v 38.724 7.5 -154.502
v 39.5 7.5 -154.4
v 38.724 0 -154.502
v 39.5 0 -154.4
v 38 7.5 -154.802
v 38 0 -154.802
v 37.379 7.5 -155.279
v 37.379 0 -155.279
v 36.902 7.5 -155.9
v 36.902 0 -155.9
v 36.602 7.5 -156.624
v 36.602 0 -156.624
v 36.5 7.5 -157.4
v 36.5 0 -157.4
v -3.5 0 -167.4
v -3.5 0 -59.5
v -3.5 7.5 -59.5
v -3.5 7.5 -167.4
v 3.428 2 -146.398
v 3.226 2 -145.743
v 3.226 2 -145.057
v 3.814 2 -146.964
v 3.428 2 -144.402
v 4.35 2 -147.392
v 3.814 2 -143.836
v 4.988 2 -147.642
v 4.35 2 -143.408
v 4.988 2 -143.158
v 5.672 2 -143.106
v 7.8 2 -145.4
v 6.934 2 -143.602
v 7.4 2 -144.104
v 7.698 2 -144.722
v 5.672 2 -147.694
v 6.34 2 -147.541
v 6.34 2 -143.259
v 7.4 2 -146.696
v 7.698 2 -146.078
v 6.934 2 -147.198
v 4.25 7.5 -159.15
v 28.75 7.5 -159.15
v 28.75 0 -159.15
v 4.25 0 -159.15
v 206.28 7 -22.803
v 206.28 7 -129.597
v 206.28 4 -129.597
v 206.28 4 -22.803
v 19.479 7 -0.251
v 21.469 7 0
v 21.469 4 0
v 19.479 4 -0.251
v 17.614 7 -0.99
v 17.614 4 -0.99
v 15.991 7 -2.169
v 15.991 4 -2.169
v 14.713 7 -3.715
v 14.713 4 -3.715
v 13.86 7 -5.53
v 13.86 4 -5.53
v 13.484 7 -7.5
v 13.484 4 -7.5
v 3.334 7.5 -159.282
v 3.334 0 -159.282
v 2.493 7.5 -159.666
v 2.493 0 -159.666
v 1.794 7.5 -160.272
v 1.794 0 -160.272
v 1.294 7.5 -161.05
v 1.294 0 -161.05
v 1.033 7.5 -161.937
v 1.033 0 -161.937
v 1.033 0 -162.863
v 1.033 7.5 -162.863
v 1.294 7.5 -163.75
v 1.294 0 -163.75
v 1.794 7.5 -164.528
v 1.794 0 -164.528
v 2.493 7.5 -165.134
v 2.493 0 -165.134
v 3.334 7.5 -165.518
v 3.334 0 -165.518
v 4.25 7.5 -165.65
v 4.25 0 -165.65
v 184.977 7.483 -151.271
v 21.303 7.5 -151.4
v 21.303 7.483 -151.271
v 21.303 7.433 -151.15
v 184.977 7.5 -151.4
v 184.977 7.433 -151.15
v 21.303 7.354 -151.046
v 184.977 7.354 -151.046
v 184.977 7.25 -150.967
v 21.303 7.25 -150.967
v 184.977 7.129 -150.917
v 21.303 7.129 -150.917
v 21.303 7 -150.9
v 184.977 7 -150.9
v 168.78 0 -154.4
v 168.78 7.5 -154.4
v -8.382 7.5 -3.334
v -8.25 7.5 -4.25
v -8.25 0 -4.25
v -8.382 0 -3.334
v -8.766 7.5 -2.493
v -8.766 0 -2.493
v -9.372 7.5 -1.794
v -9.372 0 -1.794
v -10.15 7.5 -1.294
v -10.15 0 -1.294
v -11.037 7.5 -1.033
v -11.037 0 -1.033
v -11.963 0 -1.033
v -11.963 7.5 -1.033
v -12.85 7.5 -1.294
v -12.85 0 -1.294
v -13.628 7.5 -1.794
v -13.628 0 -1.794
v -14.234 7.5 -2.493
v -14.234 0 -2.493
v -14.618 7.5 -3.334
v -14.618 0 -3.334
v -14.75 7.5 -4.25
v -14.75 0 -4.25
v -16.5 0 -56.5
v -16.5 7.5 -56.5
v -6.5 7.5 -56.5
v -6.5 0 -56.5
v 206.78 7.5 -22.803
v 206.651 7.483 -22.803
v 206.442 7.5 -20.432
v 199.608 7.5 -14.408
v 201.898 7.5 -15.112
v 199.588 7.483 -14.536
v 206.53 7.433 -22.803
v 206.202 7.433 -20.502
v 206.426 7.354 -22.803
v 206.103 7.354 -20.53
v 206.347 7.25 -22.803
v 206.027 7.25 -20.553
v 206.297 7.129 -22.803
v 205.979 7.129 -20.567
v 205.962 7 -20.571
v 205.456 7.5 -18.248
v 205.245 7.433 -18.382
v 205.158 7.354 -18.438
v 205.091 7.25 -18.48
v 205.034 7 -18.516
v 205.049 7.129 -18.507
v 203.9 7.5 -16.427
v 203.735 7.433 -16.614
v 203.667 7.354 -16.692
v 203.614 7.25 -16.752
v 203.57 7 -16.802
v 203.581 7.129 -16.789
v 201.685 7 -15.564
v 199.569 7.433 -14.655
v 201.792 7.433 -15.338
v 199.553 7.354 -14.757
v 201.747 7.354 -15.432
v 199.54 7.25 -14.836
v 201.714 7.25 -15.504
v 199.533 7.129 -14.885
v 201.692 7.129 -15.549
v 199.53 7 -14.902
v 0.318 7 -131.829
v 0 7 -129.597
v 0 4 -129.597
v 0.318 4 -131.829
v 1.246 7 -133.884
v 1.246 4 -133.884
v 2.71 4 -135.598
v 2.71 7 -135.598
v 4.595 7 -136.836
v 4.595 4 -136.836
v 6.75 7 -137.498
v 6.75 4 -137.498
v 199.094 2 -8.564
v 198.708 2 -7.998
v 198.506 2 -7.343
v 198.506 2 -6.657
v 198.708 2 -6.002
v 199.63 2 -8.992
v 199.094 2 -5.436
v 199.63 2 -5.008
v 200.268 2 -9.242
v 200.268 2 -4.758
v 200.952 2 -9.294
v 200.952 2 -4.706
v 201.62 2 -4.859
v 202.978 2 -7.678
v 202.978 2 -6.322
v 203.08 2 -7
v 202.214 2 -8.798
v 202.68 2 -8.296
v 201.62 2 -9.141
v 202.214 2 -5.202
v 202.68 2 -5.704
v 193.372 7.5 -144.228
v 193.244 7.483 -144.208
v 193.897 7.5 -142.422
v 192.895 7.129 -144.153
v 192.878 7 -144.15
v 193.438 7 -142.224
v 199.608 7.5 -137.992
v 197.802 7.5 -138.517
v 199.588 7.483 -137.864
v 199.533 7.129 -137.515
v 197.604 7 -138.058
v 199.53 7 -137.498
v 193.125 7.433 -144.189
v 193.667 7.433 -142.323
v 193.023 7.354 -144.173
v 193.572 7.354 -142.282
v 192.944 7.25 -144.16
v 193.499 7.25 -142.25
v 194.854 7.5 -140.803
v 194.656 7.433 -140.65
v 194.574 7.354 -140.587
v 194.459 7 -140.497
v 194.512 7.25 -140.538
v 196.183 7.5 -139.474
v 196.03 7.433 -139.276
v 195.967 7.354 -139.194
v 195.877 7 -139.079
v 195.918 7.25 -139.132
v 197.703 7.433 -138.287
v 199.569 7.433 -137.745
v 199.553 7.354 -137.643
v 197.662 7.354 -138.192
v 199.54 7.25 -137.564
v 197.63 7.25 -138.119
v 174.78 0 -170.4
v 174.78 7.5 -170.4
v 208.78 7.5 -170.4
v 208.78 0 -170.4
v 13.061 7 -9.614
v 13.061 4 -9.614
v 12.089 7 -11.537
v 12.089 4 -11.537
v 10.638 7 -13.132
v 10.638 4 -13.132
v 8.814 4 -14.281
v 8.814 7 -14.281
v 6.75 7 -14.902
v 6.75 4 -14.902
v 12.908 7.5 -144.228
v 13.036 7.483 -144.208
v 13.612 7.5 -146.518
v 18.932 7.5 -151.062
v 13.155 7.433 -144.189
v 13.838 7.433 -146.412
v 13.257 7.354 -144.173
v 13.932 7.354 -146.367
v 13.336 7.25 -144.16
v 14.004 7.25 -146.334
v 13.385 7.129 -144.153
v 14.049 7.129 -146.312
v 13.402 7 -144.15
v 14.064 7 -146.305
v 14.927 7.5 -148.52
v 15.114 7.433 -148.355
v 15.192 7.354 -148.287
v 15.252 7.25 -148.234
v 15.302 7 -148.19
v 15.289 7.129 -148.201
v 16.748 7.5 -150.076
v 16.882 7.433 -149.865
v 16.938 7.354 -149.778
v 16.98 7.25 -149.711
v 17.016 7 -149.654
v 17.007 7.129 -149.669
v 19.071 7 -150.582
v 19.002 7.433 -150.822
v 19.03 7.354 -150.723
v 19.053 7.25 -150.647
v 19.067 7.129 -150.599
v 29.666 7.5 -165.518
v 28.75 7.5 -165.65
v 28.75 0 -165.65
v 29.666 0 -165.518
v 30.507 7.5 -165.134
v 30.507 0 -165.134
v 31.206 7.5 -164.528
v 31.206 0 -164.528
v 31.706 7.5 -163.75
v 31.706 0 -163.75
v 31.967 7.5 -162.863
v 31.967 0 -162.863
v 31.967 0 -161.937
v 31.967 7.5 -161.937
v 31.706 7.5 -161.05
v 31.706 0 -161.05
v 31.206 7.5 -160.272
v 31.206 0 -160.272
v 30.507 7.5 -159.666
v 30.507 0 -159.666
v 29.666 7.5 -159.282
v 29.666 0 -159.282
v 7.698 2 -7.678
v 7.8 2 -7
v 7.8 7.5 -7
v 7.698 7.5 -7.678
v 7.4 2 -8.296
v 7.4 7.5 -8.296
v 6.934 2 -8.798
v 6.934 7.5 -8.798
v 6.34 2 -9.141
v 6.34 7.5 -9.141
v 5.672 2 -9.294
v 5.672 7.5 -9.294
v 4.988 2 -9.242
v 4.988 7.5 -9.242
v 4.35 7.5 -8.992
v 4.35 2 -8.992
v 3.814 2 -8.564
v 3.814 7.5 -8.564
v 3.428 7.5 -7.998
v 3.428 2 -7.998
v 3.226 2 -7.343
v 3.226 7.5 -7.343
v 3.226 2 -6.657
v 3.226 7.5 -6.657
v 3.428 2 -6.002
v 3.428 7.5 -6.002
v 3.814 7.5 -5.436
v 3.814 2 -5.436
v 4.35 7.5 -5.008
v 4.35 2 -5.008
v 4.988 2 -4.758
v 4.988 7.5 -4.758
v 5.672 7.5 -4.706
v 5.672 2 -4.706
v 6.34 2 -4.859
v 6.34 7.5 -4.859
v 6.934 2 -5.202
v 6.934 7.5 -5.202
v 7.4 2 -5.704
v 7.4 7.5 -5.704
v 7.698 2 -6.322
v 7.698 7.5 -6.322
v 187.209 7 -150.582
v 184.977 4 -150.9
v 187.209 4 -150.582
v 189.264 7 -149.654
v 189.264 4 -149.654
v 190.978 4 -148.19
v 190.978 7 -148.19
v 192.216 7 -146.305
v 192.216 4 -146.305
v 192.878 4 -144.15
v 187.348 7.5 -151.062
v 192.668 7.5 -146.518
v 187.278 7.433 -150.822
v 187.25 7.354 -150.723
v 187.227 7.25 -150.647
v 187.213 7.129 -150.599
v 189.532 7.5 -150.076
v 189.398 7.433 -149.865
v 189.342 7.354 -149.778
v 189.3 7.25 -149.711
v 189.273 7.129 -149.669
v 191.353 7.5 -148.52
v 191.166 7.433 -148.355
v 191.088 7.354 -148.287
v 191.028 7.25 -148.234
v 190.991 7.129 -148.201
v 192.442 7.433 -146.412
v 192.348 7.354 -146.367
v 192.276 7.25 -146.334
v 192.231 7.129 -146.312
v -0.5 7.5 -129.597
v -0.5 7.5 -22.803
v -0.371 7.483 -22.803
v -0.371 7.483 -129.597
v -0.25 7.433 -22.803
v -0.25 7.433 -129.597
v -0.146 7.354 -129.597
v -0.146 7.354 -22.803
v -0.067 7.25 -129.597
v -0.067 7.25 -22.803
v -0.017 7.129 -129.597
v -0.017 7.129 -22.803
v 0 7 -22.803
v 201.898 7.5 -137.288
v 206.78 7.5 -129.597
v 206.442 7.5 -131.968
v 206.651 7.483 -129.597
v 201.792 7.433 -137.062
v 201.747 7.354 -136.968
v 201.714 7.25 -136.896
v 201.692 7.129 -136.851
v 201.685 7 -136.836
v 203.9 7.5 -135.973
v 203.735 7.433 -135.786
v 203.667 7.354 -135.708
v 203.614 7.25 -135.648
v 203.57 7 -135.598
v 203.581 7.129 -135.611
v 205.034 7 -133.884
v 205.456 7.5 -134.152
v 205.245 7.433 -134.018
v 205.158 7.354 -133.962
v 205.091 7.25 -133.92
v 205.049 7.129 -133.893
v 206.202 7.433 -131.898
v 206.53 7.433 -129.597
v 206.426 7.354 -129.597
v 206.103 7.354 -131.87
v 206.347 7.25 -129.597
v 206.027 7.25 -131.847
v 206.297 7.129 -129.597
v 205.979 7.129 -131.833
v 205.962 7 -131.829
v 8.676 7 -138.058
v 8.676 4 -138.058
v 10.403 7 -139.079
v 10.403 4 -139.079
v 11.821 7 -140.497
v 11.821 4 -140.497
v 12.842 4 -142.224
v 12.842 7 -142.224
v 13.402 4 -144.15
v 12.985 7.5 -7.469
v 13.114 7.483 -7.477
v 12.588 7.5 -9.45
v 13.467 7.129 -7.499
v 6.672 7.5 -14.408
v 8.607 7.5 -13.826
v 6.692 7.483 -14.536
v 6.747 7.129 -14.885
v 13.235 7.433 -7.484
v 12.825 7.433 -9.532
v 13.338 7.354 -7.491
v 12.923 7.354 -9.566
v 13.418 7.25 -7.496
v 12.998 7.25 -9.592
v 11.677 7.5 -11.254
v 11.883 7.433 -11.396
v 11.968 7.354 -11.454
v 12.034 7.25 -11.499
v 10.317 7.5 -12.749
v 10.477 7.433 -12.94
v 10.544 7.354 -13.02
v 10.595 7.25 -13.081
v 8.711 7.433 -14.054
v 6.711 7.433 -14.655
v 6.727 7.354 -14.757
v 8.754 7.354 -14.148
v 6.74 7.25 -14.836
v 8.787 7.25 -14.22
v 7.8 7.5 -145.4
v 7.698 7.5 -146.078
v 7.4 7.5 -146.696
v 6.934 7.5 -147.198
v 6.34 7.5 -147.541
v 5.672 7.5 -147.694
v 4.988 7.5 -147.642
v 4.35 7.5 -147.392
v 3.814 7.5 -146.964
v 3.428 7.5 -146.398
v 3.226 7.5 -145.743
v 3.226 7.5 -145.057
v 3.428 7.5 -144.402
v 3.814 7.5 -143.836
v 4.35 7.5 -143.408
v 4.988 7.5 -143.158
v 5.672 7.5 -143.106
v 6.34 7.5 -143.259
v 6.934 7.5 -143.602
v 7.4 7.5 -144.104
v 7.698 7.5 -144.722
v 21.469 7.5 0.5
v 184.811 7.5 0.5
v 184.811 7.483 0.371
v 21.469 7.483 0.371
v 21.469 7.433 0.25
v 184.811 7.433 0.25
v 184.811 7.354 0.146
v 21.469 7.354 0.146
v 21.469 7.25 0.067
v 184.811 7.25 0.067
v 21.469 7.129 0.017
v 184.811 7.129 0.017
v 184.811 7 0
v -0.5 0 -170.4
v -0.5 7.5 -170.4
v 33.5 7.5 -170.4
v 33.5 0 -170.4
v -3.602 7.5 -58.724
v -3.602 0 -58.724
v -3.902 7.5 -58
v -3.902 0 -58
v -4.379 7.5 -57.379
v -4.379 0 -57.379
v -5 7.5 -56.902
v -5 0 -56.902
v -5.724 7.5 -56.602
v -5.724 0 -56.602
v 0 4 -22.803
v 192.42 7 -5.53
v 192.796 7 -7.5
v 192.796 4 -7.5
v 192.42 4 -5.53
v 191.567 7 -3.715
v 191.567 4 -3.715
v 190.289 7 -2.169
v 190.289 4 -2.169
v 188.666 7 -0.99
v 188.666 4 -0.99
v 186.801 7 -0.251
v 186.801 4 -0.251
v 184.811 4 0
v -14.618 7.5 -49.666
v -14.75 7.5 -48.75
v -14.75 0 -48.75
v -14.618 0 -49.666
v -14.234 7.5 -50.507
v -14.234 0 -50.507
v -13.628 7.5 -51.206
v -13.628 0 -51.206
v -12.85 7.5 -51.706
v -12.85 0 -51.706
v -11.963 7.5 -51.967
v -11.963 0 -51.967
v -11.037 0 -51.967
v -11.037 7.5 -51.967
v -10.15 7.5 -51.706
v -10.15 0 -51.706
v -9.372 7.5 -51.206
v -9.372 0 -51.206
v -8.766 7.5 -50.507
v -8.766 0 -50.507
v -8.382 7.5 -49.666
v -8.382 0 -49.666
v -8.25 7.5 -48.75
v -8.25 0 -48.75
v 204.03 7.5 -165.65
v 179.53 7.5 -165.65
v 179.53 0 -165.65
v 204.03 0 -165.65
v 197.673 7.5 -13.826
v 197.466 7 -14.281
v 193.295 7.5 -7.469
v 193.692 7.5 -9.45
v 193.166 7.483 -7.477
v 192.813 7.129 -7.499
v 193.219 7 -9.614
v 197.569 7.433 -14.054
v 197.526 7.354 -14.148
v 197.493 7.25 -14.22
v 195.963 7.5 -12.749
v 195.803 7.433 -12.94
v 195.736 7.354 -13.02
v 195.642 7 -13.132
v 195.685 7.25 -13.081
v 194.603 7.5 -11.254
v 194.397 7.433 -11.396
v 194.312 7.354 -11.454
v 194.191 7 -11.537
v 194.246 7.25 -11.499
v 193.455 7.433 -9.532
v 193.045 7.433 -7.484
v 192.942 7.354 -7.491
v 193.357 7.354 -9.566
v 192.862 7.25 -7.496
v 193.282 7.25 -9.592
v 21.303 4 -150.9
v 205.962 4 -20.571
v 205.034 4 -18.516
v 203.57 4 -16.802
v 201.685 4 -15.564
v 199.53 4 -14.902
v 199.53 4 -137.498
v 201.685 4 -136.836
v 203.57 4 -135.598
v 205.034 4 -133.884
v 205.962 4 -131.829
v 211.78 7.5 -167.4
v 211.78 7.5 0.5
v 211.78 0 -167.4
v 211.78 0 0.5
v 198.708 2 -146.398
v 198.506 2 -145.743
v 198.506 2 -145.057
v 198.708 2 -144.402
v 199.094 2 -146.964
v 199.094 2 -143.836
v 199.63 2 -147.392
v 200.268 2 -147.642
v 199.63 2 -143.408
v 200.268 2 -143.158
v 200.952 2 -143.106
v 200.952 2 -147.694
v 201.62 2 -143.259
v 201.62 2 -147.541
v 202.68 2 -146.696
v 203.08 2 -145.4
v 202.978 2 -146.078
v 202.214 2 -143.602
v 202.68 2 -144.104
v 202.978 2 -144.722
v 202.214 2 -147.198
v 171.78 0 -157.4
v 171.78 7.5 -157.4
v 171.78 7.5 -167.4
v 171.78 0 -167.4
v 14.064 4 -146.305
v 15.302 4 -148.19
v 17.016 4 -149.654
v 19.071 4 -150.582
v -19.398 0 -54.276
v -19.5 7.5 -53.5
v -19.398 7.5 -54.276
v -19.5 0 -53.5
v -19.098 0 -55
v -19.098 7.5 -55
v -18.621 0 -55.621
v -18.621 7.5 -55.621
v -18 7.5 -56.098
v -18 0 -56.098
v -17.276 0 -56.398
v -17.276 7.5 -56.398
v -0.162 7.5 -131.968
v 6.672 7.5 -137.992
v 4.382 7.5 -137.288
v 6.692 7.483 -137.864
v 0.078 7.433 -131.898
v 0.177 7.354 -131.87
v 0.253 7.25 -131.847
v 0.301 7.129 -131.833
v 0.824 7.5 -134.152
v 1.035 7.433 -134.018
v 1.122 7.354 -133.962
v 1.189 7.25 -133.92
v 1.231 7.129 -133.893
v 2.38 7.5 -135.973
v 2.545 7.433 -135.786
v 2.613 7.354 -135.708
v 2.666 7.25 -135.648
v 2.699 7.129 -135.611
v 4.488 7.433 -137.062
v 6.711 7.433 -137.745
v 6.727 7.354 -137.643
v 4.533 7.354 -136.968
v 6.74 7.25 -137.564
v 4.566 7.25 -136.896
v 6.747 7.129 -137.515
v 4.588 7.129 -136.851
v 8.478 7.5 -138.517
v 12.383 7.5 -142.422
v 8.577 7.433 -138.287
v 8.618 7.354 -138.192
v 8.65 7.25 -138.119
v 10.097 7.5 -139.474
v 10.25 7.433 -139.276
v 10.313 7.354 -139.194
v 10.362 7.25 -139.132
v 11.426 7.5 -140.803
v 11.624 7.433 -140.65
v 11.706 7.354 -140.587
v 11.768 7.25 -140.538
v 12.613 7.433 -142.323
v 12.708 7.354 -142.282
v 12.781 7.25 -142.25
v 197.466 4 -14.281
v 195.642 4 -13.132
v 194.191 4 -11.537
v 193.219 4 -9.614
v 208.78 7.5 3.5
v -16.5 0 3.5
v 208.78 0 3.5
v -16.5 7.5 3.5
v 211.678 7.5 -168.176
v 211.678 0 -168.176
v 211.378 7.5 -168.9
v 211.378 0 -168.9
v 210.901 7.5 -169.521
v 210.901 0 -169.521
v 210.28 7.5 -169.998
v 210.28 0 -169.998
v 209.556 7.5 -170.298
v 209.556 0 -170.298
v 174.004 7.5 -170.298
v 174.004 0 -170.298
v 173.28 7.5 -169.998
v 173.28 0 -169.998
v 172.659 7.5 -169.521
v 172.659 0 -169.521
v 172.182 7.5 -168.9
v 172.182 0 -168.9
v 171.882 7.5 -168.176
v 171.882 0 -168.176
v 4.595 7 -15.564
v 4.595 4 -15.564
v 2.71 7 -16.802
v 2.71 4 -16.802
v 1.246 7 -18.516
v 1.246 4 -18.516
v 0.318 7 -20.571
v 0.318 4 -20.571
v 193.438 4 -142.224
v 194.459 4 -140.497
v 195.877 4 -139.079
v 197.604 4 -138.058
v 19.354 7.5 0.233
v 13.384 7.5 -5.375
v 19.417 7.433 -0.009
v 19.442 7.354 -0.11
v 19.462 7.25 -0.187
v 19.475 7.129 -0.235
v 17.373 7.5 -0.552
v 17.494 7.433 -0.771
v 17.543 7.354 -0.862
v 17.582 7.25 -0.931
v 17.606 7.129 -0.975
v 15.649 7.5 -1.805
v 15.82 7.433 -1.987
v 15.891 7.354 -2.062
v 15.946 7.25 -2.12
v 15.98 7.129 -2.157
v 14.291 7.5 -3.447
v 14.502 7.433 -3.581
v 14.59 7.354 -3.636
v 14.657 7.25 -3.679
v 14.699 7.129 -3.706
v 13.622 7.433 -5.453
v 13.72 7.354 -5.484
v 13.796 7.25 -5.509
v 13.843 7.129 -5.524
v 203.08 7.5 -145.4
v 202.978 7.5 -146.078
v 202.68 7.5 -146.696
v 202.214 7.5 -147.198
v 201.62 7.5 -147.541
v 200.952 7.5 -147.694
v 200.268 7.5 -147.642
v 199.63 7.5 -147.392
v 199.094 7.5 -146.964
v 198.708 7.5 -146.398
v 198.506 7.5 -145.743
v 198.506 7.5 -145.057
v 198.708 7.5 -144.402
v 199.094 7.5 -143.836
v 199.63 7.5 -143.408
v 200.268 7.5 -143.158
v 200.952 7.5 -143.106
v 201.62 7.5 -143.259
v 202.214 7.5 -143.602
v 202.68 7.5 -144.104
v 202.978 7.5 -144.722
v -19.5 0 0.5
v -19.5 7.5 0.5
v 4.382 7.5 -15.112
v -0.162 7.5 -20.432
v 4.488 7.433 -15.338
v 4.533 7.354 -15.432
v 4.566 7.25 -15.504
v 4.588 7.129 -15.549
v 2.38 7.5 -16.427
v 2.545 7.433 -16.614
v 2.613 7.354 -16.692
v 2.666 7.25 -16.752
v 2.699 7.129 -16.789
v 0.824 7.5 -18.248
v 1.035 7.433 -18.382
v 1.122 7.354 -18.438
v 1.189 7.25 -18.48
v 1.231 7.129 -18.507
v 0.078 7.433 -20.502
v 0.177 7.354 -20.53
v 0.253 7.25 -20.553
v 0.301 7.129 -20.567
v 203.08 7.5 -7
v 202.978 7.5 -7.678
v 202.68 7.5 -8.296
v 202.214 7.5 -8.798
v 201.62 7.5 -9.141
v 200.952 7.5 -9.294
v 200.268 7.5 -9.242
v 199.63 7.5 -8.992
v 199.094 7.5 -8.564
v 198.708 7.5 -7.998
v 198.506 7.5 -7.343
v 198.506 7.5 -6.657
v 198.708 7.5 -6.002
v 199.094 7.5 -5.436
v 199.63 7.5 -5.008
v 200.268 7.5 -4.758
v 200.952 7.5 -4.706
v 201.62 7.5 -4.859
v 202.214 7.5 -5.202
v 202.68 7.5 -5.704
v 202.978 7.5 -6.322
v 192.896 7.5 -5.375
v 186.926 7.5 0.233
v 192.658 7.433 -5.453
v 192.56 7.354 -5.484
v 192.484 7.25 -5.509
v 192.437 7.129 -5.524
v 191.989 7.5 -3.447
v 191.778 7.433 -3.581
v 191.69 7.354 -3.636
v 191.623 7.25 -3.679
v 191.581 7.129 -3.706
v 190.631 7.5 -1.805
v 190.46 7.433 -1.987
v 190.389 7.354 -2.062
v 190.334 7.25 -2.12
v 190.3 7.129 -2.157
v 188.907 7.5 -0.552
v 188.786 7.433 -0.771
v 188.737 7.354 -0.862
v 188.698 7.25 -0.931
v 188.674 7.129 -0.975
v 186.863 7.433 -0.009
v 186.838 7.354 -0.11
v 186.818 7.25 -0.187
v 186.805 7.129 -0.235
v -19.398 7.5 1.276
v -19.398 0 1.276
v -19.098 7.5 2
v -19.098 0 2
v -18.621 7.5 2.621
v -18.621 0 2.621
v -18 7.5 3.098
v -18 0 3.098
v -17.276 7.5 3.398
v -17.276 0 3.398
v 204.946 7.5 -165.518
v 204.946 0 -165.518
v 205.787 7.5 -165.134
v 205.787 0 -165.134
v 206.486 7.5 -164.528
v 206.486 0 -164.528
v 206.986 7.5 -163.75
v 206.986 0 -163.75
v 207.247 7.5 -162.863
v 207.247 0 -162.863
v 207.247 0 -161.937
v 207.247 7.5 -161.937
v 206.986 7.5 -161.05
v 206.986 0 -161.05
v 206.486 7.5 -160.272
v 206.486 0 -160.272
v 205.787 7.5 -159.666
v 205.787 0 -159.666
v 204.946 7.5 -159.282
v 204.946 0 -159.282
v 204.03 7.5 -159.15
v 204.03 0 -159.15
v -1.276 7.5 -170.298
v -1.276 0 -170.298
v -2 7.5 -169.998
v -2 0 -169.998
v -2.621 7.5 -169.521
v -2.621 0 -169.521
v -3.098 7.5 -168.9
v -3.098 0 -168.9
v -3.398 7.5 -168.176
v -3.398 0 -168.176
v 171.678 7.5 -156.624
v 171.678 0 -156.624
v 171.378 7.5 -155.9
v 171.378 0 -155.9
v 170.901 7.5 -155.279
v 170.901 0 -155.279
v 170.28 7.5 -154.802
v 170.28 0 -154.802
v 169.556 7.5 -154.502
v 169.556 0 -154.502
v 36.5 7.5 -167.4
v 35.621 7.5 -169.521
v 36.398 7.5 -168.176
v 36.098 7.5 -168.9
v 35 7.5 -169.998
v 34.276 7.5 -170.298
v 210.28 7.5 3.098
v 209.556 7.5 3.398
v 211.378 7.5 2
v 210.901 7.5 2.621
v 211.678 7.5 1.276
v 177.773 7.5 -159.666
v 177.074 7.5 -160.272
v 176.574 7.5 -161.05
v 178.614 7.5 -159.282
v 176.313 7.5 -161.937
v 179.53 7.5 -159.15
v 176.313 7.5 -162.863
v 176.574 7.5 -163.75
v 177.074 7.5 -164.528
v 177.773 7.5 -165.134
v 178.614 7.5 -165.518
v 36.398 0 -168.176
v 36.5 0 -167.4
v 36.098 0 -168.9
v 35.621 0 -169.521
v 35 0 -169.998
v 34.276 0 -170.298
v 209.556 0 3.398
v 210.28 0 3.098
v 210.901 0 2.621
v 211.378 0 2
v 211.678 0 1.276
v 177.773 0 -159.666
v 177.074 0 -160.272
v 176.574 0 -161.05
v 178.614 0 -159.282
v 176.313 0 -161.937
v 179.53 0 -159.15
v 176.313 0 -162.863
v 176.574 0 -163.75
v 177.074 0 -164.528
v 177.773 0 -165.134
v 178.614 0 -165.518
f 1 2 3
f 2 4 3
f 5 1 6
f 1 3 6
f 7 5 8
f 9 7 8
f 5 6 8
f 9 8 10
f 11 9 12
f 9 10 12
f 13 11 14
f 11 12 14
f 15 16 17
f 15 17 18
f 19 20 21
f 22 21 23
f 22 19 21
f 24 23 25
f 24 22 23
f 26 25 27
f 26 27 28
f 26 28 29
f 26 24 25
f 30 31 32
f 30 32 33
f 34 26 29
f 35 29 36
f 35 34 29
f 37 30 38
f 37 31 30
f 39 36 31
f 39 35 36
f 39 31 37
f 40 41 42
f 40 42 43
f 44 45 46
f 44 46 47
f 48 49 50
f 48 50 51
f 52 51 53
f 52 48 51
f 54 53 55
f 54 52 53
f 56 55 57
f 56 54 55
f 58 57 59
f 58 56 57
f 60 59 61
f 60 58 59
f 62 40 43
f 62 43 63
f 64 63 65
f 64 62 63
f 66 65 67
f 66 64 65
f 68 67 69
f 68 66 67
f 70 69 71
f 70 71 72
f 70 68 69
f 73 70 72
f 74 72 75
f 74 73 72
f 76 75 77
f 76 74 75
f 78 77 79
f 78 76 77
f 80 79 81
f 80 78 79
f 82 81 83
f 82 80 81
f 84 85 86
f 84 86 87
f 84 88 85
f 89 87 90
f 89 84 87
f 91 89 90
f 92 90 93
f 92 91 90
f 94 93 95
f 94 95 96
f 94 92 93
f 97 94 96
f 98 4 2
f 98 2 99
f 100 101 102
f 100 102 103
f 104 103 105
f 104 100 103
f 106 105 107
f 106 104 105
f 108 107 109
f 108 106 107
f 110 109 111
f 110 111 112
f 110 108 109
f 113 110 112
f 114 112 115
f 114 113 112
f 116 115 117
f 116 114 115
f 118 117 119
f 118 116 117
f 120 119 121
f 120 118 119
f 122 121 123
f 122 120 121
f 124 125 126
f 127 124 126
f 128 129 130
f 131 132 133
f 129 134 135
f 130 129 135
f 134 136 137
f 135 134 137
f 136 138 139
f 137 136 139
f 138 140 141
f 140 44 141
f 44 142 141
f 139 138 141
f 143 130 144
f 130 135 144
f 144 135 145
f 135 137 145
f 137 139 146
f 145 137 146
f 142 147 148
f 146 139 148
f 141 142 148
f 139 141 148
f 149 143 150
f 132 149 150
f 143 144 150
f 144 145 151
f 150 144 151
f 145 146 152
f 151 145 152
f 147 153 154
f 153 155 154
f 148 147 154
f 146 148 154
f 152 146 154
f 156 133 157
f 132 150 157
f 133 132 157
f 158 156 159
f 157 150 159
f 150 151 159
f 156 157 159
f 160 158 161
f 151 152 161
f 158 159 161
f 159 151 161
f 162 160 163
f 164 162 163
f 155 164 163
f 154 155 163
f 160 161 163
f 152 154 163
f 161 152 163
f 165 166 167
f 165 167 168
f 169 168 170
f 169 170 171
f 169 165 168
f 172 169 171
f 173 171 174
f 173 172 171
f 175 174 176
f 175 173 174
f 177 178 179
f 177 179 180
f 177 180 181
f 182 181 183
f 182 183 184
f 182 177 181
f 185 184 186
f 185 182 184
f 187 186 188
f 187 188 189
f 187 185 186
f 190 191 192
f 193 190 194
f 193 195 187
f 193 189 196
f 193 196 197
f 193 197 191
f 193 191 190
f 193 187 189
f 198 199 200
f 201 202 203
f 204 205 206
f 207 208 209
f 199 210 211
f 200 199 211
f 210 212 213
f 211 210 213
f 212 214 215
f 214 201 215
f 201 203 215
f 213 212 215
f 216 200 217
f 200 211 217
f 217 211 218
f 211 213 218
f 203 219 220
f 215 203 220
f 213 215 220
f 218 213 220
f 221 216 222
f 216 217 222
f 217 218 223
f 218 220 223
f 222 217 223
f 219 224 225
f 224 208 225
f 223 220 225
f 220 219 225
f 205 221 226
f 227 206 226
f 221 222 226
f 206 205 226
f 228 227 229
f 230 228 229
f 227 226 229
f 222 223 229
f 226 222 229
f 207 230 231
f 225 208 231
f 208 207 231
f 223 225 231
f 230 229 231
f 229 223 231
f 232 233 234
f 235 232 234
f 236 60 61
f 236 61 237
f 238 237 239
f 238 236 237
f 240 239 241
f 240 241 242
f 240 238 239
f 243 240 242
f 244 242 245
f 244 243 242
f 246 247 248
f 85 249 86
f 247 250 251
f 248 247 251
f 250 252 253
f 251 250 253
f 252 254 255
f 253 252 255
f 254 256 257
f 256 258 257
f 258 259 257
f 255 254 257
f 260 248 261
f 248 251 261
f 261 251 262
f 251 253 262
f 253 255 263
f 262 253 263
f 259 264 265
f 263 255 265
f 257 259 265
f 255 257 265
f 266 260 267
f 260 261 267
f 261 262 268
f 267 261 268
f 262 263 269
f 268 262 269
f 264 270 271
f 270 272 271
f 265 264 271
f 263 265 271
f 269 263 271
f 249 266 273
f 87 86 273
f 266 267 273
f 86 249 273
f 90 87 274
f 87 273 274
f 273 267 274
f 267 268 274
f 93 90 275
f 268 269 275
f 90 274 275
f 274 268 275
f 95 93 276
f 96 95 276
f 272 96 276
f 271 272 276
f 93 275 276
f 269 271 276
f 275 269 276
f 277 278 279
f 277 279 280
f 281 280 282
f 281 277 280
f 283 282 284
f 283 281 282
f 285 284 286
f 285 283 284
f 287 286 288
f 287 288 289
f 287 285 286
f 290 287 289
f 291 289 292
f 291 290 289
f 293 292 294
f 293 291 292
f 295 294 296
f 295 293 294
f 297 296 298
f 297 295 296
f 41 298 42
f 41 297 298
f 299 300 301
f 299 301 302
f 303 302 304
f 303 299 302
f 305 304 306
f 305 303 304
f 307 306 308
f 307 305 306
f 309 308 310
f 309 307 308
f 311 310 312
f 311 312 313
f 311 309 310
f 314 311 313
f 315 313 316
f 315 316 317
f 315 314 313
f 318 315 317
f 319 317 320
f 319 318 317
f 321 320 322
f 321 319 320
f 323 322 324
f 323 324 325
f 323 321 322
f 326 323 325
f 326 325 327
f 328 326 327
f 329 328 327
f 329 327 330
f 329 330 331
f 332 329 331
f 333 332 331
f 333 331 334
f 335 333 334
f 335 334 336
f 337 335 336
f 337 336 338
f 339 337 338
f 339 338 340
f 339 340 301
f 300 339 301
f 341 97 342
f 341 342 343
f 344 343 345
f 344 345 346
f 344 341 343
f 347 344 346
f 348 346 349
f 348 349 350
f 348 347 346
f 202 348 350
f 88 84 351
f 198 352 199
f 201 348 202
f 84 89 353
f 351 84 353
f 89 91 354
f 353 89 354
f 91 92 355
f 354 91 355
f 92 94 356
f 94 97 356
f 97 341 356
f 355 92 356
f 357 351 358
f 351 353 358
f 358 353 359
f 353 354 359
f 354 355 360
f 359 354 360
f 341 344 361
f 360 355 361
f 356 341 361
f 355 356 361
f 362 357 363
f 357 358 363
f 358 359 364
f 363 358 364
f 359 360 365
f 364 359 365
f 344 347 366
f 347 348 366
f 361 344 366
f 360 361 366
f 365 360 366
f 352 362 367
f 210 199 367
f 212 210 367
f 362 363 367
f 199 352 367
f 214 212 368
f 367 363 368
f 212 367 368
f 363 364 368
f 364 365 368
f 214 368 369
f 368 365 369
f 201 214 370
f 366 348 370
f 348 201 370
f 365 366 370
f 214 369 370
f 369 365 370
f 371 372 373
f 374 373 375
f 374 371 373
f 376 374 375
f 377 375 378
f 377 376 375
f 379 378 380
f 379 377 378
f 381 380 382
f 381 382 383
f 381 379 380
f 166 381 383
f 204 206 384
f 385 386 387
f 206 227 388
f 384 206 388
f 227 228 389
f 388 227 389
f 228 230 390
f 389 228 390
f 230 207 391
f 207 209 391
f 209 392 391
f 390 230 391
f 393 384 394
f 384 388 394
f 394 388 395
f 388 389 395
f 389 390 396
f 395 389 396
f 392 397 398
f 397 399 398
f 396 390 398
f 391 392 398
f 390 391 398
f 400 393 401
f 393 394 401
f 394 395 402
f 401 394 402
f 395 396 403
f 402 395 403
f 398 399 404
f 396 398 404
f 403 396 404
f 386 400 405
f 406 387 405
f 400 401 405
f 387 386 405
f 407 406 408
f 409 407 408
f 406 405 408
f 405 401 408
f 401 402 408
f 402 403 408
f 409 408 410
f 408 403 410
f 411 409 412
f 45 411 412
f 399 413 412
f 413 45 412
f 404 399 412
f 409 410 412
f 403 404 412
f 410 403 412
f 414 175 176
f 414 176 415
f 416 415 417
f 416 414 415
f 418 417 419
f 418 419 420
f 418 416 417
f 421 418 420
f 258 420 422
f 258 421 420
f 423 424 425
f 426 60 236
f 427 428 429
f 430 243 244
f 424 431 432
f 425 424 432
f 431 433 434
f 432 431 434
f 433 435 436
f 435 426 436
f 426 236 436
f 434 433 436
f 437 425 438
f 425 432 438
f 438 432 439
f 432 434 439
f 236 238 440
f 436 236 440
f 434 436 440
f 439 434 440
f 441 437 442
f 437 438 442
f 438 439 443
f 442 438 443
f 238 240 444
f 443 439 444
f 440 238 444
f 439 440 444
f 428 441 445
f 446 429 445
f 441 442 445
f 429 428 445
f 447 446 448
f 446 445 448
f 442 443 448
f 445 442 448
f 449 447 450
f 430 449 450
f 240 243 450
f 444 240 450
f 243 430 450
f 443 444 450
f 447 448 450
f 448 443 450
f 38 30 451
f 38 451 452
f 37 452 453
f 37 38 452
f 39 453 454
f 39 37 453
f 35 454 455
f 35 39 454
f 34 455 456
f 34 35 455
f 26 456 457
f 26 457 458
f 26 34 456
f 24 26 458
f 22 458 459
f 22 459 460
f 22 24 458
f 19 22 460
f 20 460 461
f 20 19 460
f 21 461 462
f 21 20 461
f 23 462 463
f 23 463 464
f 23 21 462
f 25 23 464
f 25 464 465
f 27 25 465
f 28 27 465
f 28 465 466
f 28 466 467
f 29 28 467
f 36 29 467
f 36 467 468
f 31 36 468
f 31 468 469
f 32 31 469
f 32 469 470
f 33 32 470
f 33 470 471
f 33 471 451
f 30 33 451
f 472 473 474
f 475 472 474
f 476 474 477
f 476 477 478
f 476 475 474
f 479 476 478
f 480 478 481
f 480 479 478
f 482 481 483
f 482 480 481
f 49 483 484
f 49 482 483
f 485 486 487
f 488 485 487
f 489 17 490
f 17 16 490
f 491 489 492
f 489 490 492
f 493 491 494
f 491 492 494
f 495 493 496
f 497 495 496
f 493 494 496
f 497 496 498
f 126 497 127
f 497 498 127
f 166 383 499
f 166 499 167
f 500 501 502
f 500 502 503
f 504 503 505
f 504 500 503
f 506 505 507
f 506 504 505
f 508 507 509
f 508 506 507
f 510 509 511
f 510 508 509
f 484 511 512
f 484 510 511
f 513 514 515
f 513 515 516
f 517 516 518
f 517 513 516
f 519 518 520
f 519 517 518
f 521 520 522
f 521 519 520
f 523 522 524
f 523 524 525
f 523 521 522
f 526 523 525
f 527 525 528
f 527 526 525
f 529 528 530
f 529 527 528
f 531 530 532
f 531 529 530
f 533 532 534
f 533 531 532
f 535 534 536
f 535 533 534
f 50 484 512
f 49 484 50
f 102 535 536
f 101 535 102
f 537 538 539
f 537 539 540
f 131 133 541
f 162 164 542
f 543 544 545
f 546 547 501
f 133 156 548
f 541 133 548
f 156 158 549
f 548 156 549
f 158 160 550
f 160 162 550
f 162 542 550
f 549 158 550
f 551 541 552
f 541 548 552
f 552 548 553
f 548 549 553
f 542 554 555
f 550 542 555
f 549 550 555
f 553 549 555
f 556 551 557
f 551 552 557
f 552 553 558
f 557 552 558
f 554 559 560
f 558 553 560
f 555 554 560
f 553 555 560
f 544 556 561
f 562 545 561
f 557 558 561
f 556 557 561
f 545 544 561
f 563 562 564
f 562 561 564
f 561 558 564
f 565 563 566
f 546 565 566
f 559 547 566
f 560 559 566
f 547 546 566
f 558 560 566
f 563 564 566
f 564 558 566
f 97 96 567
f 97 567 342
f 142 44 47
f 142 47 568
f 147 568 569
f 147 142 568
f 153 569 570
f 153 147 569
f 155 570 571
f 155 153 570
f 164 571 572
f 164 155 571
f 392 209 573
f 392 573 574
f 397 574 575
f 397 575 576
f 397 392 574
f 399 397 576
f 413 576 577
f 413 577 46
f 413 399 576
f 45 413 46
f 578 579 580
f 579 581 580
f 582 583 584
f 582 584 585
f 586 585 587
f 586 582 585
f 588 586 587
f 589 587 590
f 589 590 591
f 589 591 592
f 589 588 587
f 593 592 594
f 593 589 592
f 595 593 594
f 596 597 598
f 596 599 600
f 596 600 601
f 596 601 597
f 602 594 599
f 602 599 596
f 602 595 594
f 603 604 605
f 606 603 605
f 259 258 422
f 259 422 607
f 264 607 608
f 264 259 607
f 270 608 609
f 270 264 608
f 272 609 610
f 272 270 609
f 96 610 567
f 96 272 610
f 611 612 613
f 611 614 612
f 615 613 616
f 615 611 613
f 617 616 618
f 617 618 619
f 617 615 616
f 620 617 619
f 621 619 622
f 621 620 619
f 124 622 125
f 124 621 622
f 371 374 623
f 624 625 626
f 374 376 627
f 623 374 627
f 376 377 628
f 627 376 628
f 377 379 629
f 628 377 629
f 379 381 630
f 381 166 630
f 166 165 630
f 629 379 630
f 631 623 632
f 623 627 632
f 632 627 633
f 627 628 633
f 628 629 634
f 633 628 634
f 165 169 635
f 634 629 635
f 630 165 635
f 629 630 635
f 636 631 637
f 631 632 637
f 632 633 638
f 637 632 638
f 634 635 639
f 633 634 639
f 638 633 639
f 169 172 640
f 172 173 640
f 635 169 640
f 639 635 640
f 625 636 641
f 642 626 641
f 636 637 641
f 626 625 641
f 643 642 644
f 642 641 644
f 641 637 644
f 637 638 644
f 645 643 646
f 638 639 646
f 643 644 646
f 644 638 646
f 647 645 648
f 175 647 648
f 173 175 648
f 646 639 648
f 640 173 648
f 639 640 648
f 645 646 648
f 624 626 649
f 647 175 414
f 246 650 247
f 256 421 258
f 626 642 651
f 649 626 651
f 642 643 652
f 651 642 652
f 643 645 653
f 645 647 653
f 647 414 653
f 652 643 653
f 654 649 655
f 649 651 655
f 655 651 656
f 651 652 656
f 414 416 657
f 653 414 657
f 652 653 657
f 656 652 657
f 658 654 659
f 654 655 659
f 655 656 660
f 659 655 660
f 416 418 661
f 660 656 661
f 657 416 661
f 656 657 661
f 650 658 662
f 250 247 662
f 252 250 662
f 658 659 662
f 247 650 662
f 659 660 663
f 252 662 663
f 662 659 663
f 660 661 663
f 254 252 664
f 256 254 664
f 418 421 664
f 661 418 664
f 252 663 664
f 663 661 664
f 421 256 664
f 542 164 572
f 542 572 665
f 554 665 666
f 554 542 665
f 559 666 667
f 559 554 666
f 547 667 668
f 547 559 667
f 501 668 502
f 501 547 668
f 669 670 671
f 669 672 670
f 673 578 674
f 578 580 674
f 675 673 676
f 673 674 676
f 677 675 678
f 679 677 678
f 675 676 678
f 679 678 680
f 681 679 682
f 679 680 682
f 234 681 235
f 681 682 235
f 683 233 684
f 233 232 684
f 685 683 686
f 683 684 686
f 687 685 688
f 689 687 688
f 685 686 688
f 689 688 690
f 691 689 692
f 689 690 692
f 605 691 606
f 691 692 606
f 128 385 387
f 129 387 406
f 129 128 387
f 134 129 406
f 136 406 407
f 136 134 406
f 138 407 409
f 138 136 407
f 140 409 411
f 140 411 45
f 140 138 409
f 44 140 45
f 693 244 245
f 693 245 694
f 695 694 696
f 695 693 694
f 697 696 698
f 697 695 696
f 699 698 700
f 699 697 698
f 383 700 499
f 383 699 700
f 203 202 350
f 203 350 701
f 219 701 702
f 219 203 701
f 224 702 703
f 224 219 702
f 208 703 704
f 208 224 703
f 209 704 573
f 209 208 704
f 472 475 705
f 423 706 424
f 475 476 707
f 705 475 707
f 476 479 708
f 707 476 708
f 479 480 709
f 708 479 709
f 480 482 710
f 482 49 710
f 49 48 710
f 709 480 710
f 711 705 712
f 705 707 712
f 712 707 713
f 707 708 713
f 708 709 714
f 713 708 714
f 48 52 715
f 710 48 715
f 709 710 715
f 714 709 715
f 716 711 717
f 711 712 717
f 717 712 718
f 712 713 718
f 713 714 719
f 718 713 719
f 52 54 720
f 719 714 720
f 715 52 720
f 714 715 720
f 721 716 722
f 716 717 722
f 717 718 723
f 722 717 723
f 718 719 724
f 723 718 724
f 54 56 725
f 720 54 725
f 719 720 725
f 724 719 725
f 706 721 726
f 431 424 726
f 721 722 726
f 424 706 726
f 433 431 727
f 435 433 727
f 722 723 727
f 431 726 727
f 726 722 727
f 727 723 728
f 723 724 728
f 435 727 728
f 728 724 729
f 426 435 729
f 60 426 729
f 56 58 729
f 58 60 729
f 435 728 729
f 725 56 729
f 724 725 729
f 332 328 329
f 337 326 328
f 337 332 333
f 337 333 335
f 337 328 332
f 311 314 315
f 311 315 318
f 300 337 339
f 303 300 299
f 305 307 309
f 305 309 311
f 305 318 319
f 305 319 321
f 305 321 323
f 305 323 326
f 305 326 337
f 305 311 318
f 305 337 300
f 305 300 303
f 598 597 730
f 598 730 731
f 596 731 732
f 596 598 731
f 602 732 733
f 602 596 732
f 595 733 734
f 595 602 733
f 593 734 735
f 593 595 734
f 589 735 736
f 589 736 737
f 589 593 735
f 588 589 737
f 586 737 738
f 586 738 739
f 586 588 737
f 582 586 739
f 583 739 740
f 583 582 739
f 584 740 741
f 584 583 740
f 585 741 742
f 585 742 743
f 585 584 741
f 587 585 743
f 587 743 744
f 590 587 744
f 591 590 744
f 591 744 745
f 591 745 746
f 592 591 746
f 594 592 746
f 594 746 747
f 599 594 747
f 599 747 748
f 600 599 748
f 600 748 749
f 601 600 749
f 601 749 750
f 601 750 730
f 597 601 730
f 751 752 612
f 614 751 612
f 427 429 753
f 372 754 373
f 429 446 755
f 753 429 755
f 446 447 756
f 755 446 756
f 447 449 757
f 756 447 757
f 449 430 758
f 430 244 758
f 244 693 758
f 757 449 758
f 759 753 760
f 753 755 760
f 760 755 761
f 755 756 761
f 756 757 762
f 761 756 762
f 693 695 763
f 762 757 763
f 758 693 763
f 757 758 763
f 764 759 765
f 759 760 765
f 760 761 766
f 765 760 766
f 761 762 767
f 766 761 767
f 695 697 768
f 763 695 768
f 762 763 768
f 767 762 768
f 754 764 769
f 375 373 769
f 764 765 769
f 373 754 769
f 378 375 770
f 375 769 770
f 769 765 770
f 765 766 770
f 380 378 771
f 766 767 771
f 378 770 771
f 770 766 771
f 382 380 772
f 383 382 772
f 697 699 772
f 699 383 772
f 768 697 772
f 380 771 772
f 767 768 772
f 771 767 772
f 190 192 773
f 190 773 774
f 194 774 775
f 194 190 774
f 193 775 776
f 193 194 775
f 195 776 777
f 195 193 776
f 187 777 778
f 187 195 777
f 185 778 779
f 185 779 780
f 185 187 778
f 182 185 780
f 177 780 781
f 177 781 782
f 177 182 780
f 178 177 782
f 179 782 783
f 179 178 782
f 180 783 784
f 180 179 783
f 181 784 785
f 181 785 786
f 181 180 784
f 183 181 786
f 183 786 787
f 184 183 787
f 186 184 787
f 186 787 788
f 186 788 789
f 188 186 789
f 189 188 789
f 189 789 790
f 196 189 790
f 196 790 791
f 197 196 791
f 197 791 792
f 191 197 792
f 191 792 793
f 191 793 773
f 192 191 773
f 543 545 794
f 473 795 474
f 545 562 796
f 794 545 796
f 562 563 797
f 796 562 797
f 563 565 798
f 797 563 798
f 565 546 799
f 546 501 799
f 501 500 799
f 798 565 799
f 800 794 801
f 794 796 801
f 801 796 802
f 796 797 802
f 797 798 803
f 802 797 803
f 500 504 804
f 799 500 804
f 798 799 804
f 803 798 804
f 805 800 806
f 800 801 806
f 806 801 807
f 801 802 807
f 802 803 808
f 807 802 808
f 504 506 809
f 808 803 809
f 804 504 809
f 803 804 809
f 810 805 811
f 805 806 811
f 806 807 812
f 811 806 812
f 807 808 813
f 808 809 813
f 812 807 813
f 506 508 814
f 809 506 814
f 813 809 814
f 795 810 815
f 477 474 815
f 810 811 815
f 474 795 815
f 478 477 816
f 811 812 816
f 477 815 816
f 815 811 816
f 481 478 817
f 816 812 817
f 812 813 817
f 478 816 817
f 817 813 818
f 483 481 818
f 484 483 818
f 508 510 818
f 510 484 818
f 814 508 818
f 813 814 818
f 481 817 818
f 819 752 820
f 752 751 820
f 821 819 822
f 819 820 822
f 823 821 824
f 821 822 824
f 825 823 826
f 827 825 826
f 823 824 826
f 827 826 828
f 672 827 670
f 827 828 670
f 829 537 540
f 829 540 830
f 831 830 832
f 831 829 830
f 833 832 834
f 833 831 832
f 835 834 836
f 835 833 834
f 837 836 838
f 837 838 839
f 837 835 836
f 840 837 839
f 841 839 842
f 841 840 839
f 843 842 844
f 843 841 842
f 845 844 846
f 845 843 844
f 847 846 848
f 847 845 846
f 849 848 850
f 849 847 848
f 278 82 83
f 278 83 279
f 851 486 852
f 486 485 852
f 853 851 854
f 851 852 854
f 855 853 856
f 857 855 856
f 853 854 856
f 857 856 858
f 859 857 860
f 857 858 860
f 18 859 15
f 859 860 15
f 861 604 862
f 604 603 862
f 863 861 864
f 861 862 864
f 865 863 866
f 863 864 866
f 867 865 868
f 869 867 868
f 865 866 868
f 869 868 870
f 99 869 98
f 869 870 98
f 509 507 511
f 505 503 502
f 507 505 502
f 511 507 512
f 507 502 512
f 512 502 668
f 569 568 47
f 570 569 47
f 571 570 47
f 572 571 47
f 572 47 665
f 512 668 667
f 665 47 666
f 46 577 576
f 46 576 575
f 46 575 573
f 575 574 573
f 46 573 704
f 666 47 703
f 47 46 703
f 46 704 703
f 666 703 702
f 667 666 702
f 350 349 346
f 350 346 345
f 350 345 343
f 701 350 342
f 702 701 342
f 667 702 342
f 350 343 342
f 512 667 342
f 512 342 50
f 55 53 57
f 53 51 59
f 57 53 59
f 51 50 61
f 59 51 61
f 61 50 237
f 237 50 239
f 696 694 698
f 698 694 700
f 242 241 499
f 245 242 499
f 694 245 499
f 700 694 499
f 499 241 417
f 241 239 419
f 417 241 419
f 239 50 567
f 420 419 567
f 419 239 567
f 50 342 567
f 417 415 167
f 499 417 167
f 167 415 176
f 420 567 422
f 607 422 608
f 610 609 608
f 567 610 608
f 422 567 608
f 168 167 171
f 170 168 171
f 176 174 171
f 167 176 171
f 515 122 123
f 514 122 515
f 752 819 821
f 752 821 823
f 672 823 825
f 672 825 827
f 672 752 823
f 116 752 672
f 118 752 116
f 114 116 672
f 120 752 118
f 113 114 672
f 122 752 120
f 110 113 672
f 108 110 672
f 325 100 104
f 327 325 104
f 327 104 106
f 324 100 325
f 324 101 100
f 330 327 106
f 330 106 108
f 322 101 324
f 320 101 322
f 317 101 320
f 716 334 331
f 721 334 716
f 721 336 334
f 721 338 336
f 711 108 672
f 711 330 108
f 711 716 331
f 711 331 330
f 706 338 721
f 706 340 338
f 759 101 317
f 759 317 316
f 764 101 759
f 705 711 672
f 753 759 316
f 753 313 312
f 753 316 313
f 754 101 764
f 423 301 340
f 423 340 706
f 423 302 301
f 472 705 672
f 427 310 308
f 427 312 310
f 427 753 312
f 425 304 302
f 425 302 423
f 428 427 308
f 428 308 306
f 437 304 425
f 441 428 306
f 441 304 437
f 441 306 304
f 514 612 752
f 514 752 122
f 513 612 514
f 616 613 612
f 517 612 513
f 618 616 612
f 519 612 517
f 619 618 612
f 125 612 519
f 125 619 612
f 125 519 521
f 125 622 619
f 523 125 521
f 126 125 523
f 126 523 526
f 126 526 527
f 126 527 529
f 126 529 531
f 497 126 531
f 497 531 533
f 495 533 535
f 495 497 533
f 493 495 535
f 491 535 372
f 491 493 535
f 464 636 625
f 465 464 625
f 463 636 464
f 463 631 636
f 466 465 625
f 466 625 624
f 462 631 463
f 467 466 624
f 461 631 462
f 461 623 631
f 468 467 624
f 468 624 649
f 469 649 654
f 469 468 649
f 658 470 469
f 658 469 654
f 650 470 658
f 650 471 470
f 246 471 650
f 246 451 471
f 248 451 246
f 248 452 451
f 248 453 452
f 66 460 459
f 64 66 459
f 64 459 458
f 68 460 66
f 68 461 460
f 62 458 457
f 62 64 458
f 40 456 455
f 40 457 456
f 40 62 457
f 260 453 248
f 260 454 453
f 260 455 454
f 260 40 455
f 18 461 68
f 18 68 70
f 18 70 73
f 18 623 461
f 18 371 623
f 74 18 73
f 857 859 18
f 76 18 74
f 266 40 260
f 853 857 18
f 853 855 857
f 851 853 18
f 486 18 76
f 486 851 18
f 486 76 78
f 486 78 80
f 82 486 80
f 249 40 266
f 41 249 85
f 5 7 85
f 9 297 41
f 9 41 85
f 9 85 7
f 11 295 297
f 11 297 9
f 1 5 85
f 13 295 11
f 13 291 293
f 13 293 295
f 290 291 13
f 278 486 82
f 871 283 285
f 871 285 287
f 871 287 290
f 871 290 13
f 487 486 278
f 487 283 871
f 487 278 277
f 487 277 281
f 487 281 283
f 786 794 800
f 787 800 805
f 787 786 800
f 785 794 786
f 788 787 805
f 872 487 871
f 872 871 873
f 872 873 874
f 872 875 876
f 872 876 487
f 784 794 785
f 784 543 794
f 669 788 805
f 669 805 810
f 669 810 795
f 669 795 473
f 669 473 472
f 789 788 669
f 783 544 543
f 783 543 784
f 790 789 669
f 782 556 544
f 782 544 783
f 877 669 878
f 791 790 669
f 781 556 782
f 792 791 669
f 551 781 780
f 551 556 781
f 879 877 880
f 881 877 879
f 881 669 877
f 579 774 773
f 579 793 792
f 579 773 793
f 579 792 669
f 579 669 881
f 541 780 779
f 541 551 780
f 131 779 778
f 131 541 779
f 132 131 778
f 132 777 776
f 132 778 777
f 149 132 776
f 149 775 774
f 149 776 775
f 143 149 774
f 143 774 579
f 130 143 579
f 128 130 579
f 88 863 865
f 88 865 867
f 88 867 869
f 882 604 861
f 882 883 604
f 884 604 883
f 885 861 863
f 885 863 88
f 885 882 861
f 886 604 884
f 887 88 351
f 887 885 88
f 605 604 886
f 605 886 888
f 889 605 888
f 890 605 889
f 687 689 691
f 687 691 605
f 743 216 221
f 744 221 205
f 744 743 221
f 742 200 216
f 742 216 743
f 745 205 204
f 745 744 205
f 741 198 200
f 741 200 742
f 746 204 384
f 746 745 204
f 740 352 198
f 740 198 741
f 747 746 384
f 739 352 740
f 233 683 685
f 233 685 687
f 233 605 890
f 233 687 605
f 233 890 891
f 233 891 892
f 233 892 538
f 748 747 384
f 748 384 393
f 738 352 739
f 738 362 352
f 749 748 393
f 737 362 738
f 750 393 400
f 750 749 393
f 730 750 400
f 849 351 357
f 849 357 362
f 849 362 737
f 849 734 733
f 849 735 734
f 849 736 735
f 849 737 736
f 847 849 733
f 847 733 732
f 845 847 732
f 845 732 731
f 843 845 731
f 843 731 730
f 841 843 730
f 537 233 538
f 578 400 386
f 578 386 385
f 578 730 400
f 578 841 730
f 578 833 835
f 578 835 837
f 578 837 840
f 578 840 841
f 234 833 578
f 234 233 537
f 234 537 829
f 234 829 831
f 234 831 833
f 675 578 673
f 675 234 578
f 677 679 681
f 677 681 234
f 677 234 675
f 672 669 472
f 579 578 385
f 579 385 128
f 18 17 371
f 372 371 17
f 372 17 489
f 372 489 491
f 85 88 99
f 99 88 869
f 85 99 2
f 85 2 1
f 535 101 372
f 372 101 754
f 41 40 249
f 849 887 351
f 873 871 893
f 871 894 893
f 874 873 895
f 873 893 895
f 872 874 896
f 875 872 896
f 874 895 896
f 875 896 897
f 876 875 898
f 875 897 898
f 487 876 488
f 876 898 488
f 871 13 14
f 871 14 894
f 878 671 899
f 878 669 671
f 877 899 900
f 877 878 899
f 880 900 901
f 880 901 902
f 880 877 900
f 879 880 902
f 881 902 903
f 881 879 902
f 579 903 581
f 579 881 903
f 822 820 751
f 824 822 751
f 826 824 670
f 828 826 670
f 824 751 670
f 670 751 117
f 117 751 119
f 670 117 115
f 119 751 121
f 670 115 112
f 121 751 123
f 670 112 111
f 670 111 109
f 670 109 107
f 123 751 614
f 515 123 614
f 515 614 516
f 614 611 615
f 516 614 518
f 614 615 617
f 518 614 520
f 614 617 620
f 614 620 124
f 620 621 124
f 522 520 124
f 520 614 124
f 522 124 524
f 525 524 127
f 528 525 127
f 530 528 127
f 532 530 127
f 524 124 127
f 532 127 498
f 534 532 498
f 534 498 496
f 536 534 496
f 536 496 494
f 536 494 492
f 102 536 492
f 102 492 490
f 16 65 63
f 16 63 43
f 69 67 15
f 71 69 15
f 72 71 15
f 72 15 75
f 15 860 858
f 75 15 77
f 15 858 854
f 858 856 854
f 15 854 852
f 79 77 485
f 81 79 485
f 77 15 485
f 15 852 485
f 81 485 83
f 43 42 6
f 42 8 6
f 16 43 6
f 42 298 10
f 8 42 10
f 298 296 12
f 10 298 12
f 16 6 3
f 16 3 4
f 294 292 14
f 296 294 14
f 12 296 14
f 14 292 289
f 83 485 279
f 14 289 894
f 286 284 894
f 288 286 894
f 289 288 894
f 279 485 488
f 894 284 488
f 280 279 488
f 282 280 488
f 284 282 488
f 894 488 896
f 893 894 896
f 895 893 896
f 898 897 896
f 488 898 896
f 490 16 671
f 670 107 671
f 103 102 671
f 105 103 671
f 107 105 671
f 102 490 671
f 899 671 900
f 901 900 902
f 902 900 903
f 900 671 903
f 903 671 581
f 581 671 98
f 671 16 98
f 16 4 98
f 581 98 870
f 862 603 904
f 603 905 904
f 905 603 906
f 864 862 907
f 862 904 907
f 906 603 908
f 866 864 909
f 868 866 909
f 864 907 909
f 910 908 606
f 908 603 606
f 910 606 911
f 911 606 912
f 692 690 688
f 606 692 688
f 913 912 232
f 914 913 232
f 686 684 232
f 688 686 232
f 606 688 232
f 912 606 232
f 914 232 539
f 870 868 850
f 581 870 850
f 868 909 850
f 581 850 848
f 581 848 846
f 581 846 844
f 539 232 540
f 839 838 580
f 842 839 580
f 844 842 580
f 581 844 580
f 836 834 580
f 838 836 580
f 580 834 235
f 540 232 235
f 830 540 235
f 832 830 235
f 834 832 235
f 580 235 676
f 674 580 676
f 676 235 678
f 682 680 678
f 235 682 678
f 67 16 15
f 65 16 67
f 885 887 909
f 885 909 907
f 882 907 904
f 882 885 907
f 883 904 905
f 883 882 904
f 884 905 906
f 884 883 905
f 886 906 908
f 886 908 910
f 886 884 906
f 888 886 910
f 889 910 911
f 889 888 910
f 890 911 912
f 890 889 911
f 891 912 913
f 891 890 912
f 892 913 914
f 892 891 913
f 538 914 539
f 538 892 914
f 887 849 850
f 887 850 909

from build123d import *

# Parameters (mm, degrees)
SKETCH1_W           = 215.28
SKETCH1_H           = 157.9
SKETCH1_R           = 2.3
BOSS_EXTRUDE1_DEPTH = 7.5
SKETCH1_2_R         = 2.3
BOSS_EXTRUDE2_DEPTH = 2
CUT_EXTRUDE1_DEPTH  = 3.5
SKETCH3_W           = 16
SKETCH3_H           = 60
SKETCH3_W_2         = 40
SKETCH3_H_2         = 16
BOSS_EXTRUDE3_DEPTH = 7.5
FILLET1_R           = 0.5
FILLET2_R           = 3


with BuildPart() as part:
    # Sketch1 → Boss-Extrude1 (new body)
    with BuildSketch(Plane(origin=(0, 0, 0), x_dir=(1, 0, 0), z_dir=(0, 1, 0))):
        with Locations((104.14, 75.45)):
            Rectangle(SKETCH1_W, SKETCH1_H)
        with Locations((5.5, 145.4)):
            Circle(SKETCH1_R, mode=Mode.SUBTRACT)
        with Locations((5.5, 7)):
            Circle(SKETCH1_R, mode=Mode.SUBTRACT)
        with Locations((200.78, 7)):
            Circle(SKETCH1_R, mode=Mode.SUBTRACT)
        with Locations((200.78, 145.4)):
            Circle(SKETCH1_R, mode=Mode.SUBTRACT)
    extrude(amount=BOSS_EXTRUDE1_DEPTH)

    # Sketch1<2> → Boss-Extrude2 (add)
    with BuildSketch(Plane(origin=(0, 0, 0), x_dir=(1, 0, 0), z_dir=(0, 1, 0))):
        with Locations((200.78, 145.4)):
            Circle(SKETCH1_2_R)
        with Locations((5.5, 7)):
            Circle(SKETCH1_2_R)
        with Locations((5.5, 145.4)):
            Circle(SKETCH1_2_R)
        with Locations((200.78, 7)):
            Circle(SKETCH1_2_R)
    extrude(amount=BOSS_EXTRUDE2_DEPTH)

    # Sketch2 → Cut-Extrude1 (cut)
    with BuildSketch(Plane(origin=(0, 7.5, 0), x_dir=(1, 0, 0), z_dir=(0, 1, 0))):
        with BuildLine():
            Line((21.303480629, 150.9), (184.976519371, 150.9))
            ThreePointArc((184.976519371, 150.9), (190.172671793, 148.98276253), (192.878259685, 144.15))
            ThreePointArc((192.878259685, 144.15), (195.123145751, 139.743145751), (199.53, 137.498259685))
            ThreePointArc((199.53, 137.498259685), (204.36276253, 134.792671793), (206.28, 129.596519371))
            Line((206.28, 129.596519371), (206.28, 22.803480629))
            ThreePointArc((206.28, 22.803480629), (204.36276253, 17.607328207), (199.53, 14.901740315))
            ThreePointArc((199.53, 14.901740315), (194.862670388, 12.383791439), (192.795640289, 7.5))
            ThreePointArc((192.795640289, 7.5), (190.288506152, 2.169048105), (184.811280577, 0))
            Line((184.811280577, 0), (21.468719423, 0))
            ThreePointArc((21.468719423, 0), (15.991493848, 2.169048105), (13.484359711, 7.5))
            ThreePointArc((13.484359711, 7.5), (11.417329612, 12.383791439), (6.75, 14.901740315))
            ThreePointArc((6.75, 14.901740315), (1.91723747, 17.607328207), (0, 22.803480629))
            Line((0, 22.803480629), (0, 129.596519371))
            ThreePointArc((0, 129.596519371), (1.91723747, 134.792671793), (6.75, 137.498259685))
            ThreePointArc((6.75, 137.498259685), (11.156854249, 139.743145751), (13.401740315, 144.15))
            ThreePointArc((13.401740315, 144.15), (16.107328207, 148.98276253), (21.303480629, 150.9))
        make_face()
    extrude(amount=-CUT_EXTRUDE1_DEPTH, mode=Mode.SUBTRACT)

    # Sketch3 → Boss-Extrude3 (add)
    with BuildSketch(Plane(origin=(0, 7.5, 0), x_dir=(1, 0, 0), z_dir=(0, 1, 0))):
        with Locations((-11.5, 26.5)):
            Rectangle(SKETCH3_W, SKETCH3_H)
        with BuildLine():
            Line((-8.25, 48.75), (-8.25, 4.25))
            ThreePointArc((-8.25, 4.25), (-11.5, 1), (-14.75, 4.25))
            Line((-14.75, 4.25), (-14.75, 48.75))
            ThreePointArc((-14.75, 48.75), (-11.5, 52), (-8.25, 48.75))
        make_face(mode=Mode.SUBTRACT)
        with Locations((16.5, 162.4)):
            Rectangle(SKETCH3_W_2, SKETCH3_H_2)
        with BuildLine():
            Line((4.25, 165.65), (28.75, 165.65))
            ThreePointArc((28.75, 165.65), (32, 162.4), (28.75, 159.15))
            Line((28.75, 159.15), (4.25, 159.15))
            ThreePointArc((4.25, 159.15), (1, 162.4), (4.25, 165.65))
        make_face(mode=Mode.SUBTRACT)
        with Locations((191.78, 162.4)):
            Rectangle(SKETCH3_W_2, SKETCH3_H_2)
        with BuildLine():
            Line((179.53, 165.65), (204.03, 165.65))
            ThreePointArc((204.03, 165.65), (207.28, 162.4), (204.03, 159.15))
            Line((204.03, 159.15), (179.53, 159.15))
            ThreePointArc((179.53, 159.15), (176.28, 162.4), (179.53, 165.65))
        make_face(mode=Mode.SUBTRACT)
    extrude(amount=-BOSS_EXTRUDE3_DEPTH)

    # Fillet1
    fillet1_edges = [part.edges().sort_by_distance(p)[0] for p in [
        (190.288506152, 7.5, -2.169048105),
        (194.862670388, 7.5, -12.383791439),
        (204.36276253, 7.5, -17.607328207),
        (206.28, 7.5, -76.2),
        (204.36276253, 7.5, -134.792671793),
        (195.123145751, 7.5, -139.743145751),
        (190.172671793, 7.5, -148.98276253),
        (103.14, 7.5, -150.9),
        (16.107328207, 7.5, -148.98276253),
        (11.156854249, 7.5, -139.743145751),
        (1.91723747, 7.5, -134.792671793),
        (0, 7.5, -76.2),
        (1.91723747, 7.5, -17.607328207),
        (11.417329612, 7.5, -12.383791439),
        (15.991493848, 7.5, -2.169048105),
        (103.14, 7.5, 0),
    ]]
    fillet(fillet1_edges, radius=FILLET1_R)

    # Fillet2
    fillet2_edges = [part.edges().sort_by_distance(p)[0] for p in [
        (-19.5, 3.75, -56.5),
        (-3.5, 3.75, -170.4),
        (36.5, 3.75, -170.4),
        (36.5, 3.75, -154.4),
        (211.78, 3.75, -170.4),
        (171.78, 3.75, -154.4),
        (171.78, 3.75, -170.4),
        (211.78, 3.75, 3.5),
        (-3.5, 3.75, -56.5),
        (-19.5, 3.75, 3.5),
    ]]
    fillet(fillet2_edges, radius=FILLET2_R)


solid = part.part
